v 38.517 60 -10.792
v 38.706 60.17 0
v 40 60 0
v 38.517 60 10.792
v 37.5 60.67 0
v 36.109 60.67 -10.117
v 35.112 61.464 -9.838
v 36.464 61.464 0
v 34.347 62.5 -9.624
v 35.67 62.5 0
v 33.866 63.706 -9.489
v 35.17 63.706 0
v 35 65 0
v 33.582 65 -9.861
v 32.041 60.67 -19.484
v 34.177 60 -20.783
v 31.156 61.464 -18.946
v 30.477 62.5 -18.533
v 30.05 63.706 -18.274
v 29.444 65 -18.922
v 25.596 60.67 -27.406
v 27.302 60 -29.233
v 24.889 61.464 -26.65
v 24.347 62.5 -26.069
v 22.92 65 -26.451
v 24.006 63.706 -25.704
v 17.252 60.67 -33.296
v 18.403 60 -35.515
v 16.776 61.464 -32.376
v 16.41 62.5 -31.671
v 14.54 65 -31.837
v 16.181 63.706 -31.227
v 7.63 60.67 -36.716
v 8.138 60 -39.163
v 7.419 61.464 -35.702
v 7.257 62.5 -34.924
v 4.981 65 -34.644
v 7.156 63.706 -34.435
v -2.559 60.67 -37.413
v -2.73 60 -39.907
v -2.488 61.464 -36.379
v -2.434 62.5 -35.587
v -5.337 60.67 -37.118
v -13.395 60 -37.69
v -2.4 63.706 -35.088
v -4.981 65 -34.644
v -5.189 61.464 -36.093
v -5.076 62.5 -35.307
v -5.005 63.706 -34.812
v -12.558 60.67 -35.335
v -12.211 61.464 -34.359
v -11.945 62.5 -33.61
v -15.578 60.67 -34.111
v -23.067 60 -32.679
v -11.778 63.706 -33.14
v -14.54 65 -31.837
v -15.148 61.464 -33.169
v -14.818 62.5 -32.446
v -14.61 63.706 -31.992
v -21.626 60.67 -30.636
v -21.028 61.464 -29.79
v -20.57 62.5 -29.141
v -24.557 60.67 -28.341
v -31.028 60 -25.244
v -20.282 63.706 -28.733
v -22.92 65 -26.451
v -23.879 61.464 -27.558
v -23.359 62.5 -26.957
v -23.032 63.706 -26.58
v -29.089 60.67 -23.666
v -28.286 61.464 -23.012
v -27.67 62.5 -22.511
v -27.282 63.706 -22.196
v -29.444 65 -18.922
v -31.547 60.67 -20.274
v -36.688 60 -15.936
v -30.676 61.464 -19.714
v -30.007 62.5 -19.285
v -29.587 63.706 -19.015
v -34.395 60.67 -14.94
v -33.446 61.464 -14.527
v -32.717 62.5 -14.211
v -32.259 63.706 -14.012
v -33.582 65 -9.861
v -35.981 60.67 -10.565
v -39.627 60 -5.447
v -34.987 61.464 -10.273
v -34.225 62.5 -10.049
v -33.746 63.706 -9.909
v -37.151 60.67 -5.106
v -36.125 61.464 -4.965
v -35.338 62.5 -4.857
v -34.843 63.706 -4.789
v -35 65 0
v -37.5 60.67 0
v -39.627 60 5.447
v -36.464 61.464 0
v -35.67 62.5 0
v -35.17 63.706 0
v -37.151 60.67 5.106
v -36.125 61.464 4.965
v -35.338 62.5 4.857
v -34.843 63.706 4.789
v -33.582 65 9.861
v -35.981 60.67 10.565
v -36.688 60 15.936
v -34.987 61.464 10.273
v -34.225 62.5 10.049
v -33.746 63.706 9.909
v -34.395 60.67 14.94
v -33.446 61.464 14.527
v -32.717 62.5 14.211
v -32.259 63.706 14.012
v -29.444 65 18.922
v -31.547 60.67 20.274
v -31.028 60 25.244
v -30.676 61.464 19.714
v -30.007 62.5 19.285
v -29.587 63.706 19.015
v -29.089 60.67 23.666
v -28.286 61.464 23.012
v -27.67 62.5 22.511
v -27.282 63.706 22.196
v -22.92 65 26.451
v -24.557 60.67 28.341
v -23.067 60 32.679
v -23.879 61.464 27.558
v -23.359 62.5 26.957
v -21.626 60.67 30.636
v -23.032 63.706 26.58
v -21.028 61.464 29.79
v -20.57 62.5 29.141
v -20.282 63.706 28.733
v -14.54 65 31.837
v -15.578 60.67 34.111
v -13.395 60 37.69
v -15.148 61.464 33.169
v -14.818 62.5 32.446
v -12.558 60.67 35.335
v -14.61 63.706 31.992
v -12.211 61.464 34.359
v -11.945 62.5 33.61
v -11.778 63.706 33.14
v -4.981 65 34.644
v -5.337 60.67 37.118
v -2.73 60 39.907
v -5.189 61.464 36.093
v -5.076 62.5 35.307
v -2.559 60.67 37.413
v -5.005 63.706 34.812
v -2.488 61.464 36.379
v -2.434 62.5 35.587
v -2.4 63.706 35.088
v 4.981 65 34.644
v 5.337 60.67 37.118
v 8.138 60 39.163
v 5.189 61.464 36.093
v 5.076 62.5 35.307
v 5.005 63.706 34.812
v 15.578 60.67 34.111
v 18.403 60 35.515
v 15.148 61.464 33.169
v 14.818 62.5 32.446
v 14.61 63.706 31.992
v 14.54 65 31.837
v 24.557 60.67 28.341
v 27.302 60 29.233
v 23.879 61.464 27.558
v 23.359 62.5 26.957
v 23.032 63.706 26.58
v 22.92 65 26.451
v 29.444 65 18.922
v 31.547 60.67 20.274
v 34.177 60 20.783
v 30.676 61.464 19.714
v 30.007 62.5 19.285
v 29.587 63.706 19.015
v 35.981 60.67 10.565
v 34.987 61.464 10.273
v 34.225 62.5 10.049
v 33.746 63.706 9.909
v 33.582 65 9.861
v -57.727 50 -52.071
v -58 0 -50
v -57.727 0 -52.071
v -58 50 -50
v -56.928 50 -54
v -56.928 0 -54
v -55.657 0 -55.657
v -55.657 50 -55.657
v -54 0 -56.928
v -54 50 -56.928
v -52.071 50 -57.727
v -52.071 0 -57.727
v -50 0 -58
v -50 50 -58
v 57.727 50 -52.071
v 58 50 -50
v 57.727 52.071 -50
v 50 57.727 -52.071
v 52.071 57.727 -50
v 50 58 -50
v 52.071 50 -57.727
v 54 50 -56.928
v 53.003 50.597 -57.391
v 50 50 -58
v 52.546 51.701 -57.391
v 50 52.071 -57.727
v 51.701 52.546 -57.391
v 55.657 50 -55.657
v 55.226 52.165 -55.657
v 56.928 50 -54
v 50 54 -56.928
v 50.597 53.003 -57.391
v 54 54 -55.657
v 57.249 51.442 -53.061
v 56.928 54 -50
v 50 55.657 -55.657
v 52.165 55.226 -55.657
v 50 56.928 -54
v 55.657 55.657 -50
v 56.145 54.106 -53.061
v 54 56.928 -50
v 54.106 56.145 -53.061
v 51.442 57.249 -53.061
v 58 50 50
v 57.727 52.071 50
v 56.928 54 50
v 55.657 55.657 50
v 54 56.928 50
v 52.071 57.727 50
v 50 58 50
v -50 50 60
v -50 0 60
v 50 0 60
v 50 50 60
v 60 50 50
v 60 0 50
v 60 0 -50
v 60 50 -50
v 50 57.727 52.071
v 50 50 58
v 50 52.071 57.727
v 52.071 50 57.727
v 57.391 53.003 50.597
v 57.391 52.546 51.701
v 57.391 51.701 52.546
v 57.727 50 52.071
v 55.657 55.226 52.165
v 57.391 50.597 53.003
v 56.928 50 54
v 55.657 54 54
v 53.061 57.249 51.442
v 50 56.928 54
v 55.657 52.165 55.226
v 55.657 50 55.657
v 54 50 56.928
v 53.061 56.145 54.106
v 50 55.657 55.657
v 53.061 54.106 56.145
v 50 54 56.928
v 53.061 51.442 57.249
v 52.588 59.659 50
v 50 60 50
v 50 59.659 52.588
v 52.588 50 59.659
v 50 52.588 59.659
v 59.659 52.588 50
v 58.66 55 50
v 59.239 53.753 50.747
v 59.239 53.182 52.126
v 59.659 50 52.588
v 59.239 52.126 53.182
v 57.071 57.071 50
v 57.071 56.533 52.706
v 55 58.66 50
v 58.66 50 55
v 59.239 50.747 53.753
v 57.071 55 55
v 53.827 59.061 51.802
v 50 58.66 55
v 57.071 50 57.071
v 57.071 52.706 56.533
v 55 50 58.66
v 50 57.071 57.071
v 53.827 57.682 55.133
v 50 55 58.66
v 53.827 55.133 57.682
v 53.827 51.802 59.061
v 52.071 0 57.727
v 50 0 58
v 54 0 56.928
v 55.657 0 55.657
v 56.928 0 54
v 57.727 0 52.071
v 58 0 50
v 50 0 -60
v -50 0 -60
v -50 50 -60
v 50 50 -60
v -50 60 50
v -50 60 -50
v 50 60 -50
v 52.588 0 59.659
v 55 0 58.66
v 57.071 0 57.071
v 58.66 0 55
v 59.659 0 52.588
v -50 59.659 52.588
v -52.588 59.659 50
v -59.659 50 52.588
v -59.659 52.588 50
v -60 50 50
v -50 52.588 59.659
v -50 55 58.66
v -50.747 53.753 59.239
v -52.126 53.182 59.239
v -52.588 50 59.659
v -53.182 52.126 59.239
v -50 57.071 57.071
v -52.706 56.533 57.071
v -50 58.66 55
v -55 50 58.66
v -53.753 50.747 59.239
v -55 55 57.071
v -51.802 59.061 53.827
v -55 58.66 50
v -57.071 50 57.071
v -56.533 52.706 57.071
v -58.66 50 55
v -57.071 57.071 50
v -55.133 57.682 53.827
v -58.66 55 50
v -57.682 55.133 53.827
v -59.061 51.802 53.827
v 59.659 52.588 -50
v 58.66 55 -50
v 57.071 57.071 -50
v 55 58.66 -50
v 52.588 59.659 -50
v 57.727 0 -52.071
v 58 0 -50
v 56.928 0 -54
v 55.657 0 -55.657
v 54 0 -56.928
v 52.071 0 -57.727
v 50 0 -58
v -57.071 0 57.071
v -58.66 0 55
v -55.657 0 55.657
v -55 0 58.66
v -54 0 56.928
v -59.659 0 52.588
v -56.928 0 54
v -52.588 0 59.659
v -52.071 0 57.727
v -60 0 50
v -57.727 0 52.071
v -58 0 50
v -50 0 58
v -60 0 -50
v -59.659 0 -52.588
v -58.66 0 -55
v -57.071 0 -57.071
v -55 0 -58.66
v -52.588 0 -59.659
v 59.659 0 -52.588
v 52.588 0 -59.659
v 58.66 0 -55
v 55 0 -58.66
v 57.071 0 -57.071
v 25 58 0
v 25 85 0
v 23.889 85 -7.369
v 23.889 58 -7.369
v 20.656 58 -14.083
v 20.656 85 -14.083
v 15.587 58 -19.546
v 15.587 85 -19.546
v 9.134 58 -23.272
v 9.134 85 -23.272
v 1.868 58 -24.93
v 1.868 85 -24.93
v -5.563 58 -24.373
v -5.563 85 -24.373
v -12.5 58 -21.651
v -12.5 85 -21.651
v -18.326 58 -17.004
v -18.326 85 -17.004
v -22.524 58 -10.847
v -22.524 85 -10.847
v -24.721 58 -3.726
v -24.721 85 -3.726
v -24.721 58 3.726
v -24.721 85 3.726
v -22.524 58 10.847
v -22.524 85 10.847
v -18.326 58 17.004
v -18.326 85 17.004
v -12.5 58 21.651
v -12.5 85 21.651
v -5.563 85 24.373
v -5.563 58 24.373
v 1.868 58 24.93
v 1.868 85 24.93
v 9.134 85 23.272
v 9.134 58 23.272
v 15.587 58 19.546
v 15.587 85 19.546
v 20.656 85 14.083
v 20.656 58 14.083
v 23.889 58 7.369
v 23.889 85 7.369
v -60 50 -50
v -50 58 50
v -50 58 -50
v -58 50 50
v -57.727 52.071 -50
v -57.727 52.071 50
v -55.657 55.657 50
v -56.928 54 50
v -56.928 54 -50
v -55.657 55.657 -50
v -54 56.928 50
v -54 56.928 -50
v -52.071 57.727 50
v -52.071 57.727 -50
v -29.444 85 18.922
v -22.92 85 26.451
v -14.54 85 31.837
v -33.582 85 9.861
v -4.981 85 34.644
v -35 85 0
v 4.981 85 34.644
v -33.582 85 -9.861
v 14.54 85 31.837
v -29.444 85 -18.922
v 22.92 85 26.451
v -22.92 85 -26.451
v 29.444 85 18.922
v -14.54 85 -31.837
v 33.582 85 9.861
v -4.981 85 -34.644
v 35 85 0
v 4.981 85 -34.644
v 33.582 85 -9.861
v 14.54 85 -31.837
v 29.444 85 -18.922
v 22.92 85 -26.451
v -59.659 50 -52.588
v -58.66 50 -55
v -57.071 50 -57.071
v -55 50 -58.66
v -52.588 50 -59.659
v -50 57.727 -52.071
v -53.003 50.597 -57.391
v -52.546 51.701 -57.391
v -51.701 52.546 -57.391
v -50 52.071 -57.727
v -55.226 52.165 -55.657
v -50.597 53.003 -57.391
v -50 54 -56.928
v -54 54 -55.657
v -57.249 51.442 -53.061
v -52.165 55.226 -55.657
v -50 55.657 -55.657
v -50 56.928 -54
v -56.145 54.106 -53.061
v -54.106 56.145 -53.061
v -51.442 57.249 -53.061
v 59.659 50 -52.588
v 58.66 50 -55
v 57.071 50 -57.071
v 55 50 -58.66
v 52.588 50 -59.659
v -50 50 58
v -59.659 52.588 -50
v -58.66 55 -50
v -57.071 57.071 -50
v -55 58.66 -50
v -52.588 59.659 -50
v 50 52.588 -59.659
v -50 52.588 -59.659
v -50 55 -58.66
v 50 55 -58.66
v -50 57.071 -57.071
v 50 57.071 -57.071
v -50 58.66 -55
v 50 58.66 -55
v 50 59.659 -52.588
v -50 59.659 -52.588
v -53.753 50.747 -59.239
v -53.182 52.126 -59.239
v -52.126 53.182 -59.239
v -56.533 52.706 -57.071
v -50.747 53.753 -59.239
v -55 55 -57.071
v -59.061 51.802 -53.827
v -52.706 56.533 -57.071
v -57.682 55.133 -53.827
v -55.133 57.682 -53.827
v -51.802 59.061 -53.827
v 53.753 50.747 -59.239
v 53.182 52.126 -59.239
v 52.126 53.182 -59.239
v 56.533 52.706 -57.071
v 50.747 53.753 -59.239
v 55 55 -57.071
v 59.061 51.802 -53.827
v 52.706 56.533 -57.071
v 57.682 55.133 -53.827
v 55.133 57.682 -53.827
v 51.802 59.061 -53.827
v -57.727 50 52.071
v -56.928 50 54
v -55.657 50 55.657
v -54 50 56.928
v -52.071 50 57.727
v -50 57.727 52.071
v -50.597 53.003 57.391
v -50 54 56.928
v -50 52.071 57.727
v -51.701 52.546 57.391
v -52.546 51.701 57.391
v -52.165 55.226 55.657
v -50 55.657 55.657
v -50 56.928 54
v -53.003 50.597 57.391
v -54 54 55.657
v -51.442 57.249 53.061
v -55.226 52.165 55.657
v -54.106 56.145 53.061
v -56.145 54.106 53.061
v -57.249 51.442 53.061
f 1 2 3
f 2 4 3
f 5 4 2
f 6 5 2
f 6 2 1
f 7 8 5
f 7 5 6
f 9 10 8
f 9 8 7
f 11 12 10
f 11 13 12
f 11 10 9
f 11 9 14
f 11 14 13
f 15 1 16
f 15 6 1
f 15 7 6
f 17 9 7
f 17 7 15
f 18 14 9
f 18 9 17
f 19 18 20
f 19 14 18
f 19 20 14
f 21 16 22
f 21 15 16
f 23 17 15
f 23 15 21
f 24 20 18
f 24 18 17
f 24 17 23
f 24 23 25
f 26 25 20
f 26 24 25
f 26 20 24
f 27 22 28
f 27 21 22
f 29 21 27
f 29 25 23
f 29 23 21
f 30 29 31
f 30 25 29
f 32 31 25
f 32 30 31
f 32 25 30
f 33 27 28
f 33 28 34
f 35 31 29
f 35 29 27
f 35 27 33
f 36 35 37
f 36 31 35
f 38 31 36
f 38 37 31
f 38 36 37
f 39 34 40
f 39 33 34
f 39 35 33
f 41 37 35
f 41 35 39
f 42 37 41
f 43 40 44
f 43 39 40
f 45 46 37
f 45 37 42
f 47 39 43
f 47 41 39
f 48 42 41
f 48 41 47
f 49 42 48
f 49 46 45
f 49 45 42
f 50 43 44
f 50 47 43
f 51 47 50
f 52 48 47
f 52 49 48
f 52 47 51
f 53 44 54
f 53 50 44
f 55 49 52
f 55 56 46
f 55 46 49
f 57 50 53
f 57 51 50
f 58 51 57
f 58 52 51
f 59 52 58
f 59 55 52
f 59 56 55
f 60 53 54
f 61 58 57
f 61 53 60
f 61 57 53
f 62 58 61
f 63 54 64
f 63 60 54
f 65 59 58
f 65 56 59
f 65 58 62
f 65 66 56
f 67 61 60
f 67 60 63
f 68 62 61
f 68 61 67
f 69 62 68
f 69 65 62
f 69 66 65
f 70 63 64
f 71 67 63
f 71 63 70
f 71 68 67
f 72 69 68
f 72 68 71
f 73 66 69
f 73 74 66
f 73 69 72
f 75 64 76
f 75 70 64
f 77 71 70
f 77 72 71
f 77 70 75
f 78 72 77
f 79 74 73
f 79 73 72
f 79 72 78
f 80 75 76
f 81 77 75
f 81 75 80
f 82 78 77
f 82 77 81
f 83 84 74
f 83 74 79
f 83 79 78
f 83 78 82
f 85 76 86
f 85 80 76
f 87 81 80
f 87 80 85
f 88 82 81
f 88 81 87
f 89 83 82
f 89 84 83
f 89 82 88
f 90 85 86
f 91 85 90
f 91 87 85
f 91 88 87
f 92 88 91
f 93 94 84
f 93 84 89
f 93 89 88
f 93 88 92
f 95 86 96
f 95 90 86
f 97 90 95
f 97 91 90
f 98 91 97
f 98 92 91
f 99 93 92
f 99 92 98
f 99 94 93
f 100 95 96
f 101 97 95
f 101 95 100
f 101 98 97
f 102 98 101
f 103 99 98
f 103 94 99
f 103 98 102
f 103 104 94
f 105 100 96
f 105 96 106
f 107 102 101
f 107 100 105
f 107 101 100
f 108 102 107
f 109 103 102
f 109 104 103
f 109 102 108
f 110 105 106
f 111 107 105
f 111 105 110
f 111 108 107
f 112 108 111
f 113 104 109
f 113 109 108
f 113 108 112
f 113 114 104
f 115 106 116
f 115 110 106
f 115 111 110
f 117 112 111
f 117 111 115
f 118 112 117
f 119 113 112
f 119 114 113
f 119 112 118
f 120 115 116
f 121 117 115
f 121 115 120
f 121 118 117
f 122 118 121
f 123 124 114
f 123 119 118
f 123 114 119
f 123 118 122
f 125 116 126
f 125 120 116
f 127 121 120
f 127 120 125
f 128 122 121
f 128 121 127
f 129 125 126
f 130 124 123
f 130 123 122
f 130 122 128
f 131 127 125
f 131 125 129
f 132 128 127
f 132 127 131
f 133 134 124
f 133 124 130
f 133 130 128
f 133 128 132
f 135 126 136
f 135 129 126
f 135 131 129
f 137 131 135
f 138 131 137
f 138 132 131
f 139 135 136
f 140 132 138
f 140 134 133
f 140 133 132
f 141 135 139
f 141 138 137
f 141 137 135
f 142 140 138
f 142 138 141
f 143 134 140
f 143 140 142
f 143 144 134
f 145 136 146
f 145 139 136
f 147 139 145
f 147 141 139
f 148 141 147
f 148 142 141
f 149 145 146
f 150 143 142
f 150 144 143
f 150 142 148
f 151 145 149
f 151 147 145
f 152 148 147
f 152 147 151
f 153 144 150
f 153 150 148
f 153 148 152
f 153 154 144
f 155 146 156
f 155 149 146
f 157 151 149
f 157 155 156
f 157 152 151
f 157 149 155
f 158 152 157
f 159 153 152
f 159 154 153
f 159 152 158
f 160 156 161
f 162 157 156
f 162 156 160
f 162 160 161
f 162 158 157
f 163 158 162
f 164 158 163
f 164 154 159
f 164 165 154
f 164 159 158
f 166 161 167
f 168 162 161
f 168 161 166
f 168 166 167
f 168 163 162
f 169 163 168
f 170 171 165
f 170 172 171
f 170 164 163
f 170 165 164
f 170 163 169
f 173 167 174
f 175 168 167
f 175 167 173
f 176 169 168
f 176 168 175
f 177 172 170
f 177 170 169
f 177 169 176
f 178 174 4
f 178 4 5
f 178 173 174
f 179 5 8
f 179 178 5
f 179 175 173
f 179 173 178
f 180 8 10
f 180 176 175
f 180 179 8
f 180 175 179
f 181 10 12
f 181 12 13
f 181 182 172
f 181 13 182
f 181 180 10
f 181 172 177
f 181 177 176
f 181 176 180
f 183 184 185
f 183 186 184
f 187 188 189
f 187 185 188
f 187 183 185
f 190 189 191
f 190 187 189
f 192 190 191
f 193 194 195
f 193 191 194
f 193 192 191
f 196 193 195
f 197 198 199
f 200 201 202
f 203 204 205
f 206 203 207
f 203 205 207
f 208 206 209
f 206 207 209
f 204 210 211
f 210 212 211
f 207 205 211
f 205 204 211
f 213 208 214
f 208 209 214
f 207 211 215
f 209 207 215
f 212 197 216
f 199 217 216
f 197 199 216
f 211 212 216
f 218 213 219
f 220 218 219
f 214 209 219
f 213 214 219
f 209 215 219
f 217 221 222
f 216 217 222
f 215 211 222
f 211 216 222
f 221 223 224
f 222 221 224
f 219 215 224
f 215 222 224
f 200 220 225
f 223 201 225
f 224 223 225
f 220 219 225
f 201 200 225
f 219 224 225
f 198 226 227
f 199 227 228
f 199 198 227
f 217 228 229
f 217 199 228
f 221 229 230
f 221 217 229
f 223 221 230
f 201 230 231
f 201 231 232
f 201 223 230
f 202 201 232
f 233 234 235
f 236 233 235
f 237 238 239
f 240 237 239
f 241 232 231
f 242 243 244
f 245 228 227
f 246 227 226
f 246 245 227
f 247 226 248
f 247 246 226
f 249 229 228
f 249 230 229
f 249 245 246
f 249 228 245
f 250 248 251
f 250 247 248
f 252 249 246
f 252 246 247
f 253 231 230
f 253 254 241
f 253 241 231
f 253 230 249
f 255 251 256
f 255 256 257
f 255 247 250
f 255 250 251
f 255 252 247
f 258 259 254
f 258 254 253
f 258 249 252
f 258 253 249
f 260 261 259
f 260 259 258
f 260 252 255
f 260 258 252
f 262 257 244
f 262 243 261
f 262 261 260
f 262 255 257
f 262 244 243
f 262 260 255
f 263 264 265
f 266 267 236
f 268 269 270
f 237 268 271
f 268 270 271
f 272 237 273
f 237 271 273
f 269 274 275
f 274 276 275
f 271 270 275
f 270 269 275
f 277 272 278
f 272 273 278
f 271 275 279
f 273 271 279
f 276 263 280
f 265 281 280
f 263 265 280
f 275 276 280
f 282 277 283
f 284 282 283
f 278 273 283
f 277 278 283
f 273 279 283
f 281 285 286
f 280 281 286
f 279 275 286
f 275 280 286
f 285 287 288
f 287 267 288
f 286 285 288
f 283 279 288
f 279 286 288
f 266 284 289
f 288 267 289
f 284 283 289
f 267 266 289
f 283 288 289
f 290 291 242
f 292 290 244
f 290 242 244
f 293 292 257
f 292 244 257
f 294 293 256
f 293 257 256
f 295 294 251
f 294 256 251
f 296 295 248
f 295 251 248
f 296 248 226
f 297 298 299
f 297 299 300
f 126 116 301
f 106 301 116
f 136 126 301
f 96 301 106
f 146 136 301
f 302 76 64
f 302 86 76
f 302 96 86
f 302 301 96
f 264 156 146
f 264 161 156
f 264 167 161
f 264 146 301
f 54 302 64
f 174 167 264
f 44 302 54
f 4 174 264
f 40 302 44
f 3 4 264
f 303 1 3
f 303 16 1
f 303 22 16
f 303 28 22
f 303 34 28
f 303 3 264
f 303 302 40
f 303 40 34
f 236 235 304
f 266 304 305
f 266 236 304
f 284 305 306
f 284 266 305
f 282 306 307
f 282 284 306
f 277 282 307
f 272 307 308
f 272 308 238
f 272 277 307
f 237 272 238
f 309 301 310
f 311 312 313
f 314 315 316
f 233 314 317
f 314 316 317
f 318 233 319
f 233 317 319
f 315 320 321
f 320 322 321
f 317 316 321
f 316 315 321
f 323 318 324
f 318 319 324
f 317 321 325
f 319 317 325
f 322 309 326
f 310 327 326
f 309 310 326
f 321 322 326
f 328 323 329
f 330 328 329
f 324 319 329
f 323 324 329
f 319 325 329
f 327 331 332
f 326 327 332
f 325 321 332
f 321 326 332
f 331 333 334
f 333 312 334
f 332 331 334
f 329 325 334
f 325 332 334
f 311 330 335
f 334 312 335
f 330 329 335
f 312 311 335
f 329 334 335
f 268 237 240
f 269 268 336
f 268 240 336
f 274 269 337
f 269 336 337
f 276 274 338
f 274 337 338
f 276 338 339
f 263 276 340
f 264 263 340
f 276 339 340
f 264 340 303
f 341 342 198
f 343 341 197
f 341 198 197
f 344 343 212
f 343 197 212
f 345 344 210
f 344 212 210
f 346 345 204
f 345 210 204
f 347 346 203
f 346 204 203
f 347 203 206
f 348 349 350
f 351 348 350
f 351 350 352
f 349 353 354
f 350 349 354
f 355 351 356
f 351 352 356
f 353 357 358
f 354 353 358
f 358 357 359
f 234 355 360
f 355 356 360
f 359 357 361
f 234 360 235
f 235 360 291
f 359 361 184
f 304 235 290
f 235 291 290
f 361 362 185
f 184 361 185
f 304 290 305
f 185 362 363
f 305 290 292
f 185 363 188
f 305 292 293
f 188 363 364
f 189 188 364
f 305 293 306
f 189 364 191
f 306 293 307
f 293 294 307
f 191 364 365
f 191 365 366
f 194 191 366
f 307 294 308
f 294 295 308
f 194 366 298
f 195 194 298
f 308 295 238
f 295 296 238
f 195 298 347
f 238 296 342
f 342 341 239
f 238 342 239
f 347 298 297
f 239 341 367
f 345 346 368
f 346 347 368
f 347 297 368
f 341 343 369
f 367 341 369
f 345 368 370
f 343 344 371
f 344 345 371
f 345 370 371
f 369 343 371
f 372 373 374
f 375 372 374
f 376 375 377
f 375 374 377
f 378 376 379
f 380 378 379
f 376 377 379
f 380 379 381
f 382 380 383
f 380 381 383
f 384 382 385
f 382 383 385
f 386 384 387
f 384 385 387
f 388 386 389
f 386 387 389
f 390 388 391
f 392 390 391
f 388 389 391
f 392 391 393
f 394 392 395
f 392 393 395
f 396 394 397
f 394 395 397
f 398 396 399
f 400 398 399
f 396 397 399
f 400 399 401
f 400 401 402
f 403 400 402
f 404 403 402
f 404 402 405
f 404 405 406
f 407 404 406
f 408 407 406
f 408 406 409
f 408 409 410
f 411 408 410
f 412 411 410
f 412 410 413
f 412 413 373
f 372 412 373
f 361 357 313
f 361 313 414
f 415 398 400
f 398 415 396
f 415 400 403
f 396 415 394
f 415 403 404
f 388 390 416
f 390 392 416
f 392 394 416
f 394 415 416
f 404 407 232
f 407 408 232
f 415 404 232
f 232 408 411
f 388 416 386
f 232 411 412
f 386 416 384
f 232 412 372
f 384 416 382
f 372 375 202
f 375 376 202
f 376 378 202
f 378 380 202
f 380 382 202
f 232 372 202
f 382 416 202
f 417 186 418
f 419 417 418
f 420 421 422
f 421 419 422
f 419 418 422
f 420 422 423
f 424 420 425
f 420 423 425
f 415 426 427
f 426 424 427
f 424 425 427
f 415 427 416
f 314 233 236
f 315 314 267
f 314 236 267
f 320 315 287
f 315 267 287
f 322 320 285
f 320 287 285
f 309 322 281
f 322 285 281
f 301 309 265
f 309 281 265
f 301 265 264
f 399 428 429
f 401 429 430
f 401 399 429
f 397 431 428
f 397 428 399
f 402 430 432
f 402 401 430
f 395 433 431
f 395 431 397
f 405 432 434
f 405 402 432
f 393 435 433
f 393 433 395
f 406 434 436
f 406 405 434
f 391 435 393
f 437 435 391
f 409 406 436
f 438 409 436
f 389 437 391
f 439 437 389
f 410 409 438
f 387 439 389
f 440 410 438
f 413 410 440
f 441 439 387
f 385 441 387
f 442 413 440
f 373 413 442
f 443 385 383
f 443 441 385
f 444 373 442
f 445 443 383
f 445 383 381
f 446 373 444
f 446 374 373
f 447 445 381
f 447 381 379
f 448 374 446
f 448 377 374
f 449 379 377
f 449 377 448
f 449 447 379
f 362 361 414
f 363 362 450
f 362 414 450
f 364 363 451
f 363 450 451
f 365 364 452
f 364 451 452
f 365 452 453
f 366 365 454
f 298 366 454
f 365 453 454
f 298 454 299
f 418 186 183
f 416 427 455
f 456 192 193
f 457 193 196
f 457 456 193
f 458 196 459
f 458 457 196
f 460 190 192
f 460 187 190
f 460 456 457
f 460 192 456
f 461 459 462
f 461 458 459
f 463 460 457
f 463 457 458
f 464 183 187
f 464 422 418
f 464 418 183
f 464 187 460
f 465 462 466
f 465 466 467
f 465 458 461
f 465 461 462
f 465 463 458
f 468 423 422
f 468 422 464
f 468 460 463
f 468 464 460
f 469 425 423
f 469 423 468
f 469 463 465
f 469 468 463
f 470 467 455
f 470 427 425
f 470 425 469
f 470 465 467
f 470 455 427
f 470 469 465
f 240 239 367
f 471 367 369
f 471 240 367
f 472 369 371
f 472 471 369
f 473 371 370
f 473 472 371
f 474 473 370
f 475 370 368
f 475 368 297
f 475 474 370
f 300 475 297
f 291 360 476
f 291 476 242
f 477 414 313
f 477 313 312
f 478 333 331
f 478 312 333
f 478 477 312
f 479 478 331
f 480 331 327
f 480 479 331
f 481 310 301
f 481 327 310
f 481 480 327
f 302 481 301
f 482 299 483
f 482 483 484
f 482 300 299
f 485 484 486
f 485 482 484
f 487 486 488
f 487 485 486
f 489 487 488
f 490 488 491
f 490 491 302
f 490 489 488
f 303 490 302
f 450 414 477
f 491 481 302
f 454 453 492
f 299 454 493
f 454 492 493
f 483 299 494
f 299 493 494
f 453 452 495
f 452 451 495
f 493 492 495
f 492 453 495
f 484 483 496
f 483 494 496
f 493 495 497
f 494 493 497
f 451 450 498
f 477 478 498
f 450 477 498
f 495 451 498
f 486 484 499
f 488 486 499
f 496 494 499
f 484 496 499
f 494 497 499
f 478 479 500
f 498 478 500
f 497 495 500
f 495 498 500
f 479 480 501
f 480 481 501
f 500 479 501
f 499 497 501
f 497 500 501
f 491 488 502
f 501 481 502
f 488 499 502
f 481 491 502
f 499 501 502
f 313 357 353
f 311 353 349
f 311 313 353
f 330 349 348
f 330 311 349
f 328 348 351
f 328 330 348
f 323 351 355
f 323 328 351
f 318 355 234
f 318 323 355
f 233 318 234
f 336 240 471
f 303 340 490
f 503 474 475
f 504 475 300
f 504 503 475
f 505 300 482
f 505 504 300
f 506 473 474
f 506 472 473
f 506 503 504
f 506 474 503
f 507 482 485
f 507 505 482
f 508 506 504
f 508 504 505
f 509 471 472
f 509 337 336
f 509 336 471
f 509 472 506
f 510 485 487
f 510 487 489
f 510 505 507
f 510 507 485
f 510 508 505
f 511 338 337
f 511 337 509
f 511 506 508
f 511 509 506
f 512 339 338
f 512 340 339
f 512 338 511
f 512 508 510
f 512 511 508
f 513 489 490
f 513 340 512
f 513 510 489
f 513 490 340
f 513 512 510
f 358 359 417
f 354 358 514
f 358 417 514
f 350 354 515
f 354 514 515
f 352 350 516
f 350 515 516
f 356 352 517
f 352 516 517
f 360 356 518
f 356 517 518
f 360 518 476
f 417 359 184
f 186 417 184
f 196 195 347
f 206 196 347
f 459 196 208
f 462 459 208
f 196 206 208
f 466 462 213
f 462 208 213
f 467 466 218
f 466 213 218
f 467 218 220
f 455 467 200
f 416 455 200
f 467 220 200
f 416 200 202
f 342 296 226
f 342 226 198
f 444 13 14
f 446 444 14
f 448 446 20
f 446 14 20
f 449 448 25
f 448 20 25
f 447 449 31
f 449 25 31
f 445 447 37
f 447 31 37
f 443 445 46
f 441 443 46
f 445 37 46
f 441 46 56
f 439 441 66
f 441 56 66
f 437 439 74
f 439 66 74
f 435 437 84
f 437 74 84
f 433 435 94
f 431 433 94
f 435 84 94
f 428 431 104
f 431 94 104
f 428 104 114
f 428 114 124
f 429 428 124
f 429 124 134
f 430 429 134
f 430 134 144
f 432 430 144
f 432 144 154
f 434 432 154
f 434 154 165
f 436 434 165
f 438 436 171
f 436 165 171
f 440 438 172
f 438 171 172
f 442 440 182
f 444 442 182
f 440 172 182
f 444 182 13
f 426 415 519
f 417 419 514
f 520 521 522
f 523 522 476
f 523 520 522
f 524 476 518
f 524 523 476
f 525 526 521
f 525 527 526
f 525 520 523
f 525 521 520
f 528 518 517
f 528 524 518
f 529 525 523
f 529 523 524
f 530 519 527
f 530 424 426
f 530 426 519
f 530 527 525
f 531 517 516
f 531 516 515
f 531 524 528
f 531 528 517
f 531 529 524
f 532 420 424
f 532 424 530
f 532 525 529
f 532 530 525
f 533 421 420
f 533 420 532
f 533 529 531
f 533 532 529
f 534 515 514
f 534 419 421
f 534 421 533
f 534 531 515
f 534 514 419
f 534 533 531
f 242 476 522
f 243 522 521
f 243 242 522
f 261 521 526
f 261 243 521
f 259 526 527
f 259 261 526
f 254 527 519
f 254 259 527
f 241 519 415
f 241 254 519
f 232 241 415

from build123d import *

# Parameters (mm, degrees)
CROQUIS2_W              = 120
CROQUIS2_H              = 120
SALIENTE_EXTRUIR1_DEPTH = 60
REDONDEO1_R             = 10
VACIADO1_T              = -2
CROQUIS3_R              = 35
SALIENTE_EXTRUIR2_DEPTH = 25
CROQUIS4_R              = 25
CORTAR_EXTRUIR1_DEPTH   = 86
REDONDEO2_R             = 5


with BuildPart() as part:
    # Croquis2 → Saliente-Extruir1 (new body)
    with BuildSketch(Plane(origin=(0, 0, 0), x_dir=(1, 0, 0), z_dir=(0, 1, 0))):
        Rectangle(CROQUIS2_W, CROQUIS2_H)
    extrude(amount=SALIENTE_EXTRUIR1_DEPTH)

    # Redondeo1
    redondeo1_edges = [part.edges().sort_by_distance(p)[0] for p in [
        (-60, 60, 0),
        (0, 60, 60),
        (60, 60, 0),
        (60, 30, 60),
        (-60, 30, 60),
        (-60, 30, -60),
        (60, 30, -60),
        (0, 60, -60),
    ]]
    fillet(redondeo1_edges, radius=REDONDEO1_R)

    # Vaciado1
    vaciado1_openings = [part.faces().sort_by_distance(p)[0] for p in [
        (0, 0, 0),
    ]]
    offset(amount=VACIADO1_T, openings=vaciado1_openings, kind=Kind.INTERSECTION)

    # Croquis3 → Saliente-Extruir2 (add)
    with BuildSketch(Plane(origin=(0, 60, 0), x_dir=(1, 0, 0), z_dir=(0, 1, 0))):
        Circle(CROQUIS3_R)
    extrude(amount=SALIENTE_EXTRUIR2_DEPTH)

    # Croquis4 → Cortar-Extruir1 (cut, through all)
    with BuildSketch(Plane(origin=(0, 85, 0), x_dir=(1, 0, 0), z_dir=(0, 1, 0))):
        Circle(CROQUIS4_R)
    extrude(amount=-CORTAR_EXTRUIR1_DEPTH, mode=Mode.SUBTRACT)

    # Redondeo2
    redondeo2_edges = [part.edges().sort_by_distance(p)[0] for p in [
        (-35, 60, 0),
    ]]
    fillet(redondeo2_edges, radius=REDONDEO2_R)


solid = part.part
